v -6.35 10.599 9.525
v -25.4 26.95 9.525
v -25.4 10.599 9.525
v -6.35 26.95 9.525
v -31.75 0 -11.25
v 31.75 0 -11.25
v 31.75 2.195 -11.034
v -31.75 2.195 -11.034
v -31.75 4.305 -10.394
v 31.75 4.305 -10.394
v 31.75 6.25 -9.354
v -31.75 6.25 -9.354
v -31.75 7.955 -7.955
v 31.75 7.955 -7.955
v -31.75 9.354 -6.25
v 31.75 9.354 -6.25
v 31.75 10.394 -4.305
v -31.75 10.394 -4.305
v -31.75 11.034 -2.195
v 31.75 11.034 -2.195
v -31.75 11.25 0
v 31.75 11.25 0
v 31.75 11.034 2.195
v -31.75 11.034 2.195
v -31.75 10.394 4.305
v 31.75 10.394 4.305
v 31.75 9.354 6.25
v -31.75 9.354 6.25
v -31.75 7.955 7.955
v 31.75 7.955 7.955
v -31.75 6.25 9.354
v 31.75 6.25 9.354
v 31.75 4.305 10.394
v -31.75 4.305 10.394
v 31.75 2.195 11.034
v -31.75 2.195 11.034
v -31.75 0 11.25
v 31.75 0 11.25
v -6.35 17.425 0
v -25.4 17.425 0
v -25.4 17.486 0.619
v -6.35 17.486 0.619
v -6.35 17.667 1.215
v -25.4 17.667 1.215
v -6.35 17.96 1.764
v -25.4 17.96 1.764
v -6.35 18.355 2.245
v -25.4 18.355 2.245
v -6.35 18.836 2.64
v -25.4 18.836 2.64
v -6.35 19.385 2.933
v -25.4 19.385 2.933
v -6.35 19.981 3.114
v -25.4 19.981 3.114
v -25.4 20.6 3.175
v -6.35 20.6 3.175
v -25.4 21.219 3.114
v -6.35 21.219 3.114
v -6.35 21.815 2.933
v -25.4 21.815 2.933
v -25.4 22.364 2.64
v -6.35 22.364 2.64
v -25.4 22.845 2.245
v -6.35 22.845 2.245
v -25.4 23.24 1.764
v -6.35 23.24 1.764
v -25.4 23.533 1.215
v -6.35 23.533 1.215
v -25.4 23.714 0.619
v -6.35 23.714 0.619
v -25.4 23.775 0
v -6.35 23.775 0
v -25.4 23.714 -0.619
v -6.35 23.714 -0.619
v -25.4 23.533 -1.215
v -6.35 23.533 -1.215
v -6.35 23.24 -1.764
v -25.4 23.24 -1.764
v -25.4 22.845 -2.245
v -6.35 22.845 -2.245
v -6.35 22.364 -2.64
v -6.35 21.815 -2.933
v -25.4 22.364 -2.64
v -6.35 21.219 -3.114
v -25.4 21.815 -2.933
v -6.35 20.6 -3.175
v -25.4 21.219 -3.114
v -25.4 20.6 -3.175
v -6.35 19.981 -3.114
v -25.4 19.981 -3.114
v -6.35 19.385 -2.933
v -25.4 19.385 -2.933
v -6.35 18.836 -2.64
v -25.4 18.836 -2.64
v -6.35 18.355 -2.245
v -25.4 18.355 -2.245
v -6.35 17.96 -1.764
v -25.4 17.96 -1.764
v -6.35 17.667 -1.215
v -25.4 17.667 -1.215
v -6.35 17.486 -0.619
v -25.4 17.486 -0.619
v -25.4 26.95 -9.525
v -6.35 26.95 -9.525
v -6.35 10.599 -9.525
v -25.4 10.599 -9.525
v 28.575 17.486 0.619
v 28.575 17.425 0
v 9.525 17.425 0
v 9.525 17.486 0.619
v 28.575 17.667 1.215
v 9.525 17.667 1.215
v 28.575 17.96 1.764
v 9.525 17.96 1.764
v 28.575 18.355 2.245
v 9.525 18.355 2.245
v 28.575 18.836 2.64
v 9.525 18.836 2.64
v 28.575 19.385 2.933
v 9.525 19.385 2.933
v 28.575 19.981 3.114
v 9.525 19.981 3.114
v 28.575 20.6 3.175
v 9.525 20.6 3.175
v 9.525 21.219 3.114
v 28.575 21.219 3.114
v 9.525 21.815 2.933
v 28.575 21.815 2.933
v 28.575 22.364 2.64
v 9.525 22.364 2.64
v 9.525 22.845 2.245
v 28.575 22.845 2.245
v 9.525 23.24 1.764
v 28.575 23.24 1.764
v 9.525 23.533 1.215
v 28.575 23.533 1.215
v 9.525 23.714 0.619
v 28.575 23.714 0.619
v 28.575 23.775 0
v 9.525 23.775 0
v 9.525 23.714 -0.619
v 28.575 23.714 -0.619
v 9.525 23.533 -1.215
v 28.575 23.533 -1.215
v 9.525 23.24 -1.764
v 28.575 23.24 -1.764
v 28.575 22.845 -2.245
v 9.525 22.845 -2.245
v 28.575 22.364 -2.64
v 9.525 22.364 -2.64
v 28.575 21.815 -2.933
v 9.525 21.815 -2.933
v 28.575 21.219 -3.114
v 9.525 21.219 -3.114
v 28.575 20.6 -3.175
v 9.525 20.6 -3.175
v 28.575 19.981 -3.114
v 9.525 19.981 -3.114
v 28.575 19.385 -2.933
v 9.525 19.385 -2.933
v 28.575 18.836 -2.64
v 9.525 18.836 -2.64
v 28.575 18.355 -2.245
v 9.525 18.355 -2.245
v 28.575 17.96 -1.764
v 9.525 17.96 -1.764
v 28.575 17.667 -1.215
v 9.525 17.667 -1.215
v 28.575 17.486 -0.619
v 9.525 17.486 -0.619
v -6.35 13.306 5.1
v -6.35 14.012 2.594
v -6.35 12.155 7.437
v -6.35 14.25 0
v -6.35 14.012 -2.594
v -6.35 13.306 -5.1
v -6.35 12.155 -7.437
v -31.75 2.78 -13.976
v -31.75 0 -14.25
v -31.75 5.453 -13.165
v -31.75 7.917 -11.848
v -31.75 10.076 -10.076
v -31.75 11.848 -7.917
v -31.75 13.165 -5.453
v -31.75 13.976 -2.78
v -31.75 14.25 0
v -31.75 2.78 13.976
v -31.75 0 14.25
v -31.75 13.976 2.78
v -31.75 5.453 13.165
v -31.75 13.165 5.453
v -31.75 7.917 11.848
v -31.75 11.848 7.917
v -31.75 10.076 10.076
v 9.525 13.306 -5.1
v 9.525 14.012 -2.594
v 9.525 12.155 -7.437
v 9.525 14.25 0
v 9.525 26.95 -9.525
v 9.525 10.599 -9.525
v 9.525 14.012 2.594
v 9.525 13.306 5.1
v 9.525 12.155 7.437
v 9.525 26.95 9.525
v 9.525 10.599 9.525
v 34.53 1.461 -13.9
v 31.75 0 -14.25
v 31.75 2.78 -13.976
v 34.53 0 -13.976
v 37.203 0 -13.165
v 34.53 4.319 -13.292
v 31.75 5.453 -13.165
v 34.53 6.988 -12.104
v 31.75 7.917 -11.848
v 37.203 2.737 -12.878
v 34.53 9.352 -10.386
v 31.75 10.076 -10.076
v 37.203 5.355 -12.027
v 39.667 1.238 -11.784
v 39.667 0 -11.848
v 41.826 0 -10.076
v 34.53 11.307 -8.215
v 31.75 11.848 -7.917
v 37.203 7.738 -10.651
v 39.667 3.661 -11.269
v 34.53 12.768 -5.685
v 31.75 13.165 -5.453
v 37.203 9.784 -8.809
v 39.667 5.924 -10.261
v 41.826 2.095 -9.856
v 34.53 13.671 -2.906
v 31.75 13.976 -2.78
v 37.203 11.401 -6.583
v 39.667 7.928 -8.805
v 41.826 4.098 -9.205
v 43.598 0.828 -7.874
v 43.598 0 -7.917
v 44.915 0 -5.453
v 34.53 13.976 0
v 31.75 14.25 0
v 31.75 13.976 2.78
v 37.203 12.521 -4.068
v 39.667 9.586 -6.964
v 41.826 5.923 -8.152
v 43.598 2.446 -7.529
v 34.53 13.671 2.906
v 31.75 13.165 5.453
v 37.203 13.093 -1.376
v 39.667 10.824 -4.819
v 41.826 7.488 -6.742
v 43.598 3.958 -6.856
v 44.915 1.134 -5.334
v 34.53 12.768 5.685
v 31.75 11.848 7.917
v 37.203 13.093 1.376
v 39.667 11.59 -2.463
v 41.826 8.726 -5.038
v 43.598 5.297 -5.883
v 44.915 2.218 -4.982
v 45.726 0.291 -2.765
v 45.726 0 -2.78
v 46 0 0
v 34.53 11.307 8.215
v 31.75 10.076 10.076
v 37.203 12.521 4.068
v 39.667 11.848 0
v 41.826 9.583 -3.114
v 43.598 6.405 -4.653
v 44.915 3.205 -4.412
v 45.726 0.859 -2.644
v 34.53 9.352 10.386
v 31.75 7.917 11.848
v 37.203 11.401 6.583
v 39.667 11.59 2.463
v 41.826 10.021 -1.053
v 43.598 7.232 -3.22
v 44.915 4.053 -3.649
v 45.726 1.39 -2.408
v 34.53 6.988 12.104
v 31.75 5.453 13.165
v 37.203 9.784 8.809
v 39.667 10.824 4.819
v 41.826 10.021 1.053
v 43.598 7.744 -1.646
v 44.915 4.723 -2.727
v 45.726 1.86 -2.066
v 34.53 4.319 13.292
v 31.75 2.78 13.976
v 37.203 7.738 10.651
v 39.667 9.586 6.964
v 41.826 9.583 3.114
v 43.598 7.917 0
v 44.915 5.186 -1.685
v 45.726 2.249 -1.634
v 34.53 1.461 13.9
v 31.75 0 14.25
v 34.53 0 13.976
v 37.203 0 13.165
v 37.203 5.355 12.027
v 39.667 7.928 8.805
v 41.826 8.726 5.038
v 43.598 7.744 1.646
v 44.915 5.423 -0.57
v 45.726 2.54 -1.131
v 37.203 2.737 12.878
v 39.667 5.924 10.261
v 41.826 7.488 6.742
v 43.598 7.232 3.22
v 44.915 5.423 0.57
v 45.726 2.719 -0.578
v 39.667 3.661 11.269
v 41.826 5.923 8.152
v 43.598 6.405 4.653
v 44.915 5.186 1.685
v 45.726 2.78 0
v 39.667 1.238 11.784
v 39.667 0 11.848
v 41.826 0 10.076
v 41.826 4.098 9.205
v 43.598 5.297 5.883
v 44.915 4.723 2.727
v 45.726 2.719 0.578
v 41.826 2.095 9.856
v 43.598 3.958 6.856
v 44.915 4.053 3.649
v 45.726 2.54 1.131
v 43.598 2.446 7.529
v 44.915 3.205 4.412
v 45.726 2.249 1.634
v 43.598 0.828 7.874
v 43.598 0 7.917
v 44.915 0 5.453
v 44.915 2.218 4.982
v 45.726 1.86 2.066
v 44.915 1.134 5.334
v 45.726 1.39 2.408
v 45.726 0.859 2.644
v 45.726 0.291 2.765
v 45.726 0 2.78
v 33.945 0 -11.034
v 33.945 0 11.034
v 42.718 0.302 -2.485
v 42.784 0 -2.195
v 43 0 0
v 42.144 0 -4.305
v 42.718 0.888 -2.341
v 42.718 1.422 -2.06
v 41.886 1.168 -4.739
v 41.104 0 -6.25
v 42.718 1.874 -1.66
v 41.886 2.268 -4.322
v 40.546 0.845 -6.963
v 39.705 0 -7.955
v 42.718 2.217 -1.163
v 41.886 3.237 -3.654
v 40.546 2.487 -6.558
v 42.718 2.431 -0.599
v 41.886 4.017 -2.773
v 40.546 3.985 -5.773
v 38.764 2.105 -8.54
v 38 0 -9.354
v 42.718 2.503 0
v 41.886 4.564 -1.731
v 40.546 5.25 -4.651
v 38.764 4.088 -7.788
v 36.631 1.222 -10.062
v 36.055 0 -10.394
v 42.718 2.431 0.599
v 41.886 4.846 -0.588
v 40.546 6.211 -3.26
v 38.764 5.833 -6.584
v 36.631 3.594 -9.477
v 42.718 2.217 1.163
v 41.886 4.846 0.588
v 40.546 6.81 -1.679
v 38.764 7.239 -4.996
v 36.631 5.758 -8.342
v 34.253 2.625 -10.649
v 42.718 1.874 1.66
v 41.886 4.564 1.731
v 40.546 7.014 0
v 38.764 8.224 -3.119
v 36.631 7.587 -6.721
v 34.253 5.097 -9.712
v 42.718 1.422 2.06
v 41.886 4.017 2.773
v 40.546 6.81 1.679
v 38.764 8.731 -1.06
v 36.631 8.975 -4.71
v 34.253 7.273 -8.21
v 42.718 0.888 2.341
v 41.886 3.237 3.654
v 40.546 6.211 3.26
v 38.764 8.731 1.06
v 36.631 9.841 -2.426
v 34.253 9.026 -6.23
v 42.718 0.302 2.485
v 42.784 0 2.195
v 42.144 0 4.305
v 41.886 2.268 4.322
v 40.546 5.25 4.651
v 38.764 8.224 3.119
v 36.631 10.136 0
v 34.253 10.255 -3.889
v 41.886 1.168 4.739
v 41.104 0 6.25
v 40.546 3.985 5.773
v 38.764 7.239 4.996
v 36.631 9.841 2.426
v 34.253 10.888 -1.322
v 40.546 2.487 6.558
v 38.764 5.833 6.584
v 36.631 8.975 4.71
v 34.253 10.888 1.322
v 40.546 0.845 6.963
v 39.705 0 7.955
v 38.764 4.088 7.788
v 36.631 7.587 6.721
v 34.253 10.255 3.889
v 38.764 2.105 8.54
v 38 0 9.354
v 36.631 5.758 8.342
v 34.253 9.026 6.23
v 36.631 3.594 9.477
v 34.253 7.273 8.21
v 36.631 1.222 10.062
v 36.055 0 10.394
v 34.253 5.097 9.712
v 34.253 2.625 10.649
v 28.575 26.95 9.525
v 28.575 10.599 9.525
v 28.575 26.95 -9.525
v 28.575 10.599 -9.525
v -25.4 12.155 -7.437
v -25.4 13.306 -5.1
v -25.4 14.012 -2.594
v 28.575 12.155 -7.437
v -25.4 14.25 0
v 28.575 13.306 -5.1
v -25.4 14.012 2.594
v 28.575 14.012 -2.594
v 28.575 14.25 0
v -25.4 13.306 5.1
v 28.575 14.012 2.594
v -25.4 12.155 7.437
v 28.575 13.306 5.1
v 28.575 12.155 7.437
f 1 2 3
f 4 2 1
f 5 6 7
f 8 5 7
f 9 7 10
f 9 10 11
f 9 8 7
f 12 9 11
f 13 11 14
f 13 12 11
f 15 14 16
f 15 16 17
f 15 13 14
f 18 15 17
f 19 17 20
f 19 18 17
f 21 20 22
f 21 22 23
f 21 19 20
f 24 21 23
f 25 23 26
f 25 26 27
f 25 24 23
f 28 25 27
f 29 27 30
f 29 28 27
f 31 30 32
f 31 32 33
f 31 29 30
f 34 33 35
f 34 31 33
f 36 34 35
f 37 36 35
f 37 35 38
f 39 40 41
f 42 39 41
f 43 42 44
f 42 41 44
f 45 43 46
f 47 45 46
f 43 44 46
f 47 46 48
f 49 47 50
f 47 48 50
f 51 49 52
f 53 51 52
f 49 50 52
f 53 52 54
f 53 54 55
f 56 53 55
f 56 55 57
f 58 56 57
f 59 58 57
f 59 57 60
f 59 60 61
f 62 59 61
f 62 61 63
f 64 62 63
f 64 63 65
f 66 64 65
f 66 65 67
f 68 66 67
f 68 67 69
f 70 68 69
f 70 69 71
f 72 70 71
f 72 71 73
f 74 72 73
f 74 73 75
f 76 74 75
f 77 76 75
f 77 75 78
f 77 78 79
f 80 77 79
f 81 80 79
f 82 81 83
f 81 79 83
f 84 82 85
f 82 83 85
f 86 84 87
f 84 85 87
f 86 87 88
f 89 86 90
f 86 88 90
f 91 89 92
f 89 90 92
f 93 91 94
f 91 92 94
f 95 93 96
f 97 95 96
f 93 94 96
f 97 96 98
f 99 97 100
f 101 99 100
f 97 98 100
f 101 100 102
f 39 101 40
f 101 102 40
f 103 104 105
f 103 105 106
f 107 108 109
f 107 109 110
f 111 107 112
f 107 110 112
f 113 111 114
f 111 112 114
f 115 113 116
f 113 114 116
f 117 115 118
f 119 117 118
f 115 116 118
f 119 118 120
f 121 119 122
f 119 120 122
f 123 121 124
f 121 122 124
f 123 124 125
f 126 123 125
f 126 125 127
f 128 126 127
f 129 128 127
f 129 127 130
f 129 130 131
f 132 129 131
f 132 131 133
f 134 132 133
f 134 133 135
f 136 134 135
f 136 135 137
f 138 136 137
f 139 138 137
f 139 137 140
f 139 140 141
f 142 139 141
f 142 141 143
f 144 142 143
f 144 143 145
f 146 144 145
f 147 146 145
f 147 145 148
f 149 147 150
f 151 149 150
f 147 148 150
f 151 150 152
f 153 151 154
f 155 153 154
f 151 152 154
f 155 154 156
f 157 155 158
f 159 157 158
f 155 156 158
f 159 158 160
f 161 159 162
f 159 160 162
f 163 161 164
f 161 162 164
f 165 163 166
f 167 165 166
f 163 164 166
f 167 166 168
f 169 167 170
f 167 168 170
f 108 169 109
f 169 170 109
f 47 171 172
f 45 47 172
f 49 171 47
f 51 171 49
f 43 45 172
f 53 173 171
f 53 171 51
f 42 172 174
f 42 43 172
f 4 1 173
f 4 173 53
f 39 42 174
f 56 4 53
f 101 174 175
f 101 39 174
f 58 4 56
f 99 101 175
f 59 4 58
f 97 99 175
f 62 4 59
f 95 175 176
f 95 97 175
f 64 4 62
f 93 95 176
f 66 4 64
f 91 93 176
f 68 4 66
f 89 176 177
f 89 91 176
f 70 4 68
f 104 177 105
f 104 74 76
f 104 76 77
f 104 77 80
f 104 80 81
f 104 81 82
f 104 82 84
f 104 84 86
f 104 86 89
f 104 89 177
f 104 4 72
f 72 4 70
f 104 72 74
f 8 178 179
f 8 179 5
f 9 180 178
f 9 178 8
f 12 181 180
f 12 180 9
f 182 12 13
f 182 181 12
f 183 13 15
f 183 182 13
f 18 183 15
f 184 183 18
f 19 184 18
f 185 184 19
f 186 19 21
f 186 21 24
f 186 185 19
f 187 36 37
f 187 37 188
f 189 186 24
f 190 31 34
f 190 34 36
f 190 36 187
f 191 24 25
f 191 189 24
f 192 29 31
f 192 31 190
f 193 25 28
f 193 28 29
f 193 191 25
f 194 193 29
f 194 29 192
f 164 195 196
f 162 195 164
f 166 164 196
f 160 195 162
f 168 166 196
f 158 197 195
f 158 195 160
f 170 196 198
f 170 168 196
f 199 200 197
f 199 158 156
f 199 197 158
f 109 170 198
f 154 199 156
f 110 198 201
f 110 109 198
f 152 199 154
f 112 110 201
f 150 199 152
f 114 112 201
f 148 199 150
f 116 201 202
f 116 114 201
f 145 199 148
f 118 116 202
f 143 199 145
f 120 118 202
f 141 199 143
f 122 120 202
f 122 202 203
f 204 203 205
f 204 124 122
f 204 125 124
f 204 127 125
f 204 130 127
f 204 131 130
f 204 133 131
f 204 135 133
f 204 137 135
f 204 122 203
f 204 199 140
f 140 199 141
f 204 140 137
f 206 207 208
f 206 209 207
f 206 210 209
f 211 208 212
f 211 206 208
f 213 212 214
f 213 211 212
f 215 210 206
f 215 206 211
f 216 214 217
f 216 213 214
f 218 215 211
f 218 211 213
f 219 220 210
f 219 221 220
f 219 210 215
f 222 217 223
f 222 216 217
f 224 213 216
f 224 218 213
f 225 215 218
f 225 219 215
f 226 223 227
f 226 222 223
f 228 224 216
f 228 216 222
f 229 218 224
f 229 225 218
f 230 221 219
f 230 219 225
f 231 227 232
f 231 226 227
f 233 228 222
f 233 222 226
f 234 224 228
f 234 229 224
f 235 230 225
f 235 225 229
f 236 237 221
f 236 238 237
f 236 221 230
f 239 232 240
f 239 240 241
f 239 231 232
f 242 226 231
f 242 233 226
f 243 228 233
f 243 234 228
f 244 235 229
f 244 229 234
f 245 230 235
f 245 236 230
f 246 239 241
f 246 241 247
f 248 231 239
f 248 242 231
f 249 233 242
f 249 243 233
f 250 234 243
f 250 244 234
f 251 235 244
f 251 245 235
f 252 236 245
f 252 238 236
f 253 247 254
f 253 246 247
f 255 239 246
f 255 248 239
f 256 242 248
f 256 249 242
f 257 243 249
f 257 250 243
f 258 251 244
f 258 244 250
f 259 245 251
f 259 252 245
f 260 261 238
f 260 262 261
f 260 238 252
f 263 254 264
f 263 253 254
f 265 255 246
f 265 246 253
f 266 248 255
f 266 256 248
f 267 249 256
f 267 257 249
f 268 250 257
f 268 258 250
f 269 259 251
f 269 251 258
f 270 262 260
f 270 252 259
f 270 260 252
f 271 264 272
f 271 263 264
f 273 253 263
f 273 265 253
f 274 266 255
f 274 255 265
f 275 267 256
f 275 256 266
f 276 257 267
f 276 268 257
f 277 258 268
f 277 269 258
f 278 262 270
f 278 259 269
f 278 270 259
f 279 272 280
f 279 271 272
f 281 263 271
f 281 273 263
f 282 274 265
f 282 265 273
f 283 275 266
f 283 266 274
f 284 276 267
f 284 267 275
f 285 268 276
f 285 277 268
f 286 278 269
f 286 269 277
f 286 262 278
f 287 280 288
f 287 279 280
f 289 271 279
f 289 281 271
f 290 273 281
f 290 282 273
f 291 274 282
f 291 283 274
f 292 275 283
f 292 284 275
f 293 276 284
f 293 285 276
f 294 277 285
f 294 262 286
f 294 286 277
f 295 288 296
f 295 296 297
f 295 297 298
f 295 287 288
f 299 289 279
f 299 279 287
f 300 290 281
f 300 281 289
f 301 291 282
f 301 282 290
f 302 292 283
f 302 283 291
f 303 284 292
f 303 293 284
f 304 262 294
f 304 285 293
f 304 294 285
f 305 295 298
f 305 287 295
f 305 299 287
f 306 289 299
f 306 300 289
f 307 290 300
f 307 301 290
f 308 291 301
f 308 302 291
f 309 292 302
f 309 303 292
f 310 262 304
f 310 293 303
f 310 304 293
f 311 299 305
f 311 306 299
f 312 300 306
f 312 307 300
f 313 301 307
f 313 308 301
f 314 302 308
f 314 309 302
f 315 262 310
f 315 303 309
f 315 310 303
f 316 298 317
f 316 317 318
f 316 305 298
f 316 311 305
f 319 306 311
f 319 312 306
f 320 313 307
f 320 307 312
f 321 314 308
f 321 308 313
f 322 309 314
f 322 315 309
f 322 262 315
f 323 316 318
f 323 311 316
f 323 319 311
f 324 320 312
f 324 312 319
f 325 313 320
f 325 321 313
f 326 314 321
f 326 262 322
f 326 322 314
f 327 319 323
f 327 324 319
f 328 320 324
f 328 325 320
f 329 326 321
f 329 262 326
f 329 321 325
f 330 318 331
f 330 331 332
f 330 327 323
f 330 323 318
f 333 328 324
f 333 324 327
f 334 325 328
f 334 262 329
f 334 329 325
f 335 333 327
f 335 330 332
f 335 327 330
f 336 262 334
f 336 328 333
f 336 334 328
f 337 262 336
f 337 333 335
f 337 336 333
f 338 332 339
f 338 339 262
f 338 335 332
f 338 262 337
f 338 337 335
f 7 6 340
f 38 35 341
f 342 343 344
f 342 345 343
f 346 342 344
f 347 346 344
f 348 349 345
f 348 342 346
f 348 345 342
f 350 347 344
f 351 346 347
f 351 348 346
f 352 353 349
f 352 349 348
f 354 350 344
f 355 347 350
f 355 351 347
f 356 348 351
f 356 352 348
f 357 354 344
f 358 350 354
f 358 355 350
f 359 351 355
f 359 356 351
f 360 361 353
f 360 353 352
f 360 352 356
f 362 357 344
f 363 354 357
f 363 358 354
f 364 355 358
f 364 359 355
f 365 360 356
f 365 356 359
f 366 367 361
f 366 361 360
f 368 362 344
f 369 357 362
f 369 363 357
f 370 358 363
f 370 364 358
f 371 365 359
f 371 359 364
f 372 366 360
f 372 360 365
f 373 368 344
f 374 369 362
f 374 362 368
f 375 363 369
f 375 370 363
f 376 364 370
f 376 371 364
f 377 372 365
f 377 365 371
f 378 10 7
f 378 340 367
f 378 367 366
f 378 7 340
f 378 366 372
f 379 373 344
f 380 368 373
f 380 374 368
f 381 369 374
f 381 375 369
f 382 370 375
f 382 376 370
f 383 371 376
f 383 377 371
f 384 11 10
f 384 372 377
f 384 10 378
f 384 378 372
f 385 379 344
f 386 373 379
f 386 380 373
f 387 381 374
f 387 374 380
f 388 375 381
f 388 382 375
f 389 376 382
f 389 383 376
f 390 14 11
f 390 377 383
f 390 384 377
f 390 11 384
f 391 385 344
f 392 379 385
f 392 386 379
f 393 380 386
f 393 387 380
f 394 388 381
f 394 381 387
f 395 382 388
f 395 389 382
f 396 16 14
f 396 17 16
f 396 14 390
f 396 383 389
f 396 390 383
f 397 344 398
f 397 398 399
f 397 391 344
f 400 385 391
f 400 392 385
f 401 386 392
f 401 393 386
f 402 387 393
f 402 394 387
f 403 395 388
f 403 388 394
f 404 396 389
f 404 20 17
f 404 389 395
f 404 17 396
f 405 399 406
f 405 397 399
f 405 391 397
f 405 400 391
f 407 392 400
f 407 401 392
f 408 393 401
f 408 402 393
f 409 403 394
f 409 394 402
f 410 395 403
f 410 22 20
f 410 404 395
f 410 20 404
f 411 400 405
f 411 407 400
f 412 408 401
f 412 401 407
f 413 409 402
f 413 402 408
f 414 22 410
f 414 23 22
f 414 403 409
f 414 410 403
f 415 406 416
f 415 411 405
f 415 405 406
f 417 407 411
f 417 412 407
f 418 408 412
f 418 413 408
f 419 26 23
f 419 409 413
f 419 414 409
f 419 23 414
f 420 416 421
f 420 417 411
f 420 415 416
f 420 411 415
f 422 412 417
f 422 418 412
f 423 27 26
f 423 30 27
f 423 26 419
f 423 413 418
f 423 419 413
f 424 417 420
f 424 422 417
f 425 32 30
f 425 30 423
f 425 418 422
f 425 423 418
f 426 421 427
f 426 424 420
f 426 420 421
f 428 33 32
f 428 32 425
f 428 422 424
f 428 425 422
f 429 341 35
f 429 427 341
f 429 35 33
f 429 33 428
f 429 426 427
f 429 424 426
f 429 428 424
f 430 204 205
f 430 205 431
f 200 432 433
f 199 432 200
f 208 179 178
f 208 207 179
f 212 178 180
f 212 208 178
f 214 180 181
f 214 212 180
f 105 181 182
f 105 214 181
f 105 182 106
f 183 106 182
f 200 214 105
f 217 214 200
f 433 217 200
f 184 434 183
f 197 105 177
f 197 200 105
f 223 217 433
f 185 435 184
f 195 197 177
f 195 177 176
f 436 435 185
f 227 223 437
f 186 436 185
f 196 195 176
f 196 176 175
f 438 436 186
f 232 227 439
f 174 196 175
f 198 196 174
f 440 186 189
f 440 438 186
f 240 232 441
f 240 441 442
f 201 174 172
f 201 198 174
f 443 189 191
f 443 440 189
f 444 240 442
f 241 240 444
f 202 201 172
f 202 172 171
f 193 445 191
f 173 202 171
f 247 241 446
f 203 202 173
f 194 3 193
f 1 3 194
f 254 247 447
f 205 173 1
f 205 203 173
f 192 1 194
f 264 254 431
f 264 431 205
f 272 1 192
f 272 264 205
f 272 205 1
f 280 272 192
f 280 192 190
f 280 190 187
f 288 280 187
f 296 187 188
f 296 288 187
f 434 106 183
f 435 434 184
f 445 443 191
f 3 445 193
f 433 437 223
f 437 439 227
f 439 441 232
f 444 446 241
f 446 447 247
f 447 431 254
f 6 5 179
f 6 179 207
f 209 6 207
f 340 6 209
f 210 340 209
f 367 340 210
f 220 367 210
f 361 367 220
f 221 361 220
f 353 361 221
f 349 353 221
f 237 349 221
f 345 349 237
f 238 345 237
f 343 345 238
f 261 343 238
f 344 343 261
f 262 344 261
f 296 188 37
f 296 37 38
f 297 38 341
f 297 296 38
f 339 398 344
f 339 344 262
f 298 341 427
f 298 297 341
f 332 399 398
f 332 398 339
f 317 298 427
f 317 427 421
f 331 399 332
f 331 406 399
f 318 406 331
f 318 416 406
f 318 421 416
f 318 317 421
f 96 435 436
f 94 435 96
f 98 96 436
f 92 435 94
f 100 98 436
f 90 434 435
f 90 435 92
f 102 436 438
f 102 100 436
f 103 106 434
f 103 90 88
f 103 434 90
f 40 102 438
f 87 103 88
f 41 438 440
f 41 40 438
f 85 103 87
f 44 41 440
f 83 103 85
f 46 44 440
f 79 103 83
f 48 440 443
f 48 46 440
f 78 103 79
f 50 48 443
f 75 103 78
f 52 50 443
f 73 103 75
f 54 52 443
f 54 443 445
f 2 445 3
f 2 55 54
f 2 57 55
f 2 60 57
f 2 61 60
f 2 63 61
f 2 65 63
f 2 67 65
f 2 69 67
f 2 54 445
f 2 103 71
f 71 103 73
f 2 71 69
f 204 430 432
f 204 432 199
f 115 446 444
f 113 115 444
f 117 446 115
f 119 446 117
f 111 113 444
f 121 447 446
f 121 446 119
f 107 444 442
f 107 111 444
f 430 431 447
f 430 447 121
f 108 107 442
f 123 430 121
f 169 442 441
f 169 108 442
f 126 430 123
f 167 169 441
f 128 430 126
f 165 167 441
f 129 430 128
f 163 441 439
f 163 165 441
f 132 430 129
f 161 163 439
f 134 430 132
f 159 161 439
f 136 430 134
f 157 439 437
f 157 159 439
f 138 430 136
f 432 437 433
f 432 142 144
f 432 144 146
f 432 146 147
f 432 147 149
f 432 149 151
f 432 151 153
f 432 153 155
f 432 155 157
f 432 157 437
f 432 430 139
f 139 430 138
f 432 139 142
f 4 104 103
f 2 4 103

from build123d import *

# Parameters (mm, degrees)
F1_ANGLE = 180
F6_R     = 3.175
F7_DEPTH = 71.401


with BuildPart() as f1:
    # F0 (on Front) → F1 (revolve)
    with BuildSketch(Plane.XZ):
        with BuildLine():
            ThreePointArc((43, 0), (39.7049512883, -7.9549512883), (31.75, -11.25))
            Line((31.75, -11.25), (0, -11.25))
            Line((0, -11.25), (-31.75, -11.25))
            Line((-31.75, -11.25), (-31.75, -14.25))
            Line((-31.75, -14.25), (31.75, -14.25))
            ThreePointArc((31.75, -14.25), (41.8262716319, -10.0762716319), (46, 0))
            Line((46, 0), (43, 0))
        make_face()
    revolve(axis=Axis((28.0016548932, 0, 0), (1, 0, 0)), revolution_arc=F1_ANGLE)

    # F4 (on face) → F5 (join, up to the next surface of F1)
    with BuildSketch(Plane(origin=(0, 26.95, 0), x_dir=(-1, 0, 0), z_dir=(0, 1, 0))):
        Polygon((25.4, 9.525), (6.35, 9.525), (6.35, 0), (6.35, -9.525), (25.4, -9.525), (25.4, 0), align=None)
        Polygon((-9.525, 0), (-9.525, 9.525), (-28.575, 9.525), (-28.575, 0), (-28.575, -9.525), (-9.525, -9.525), align=None)
    extrude(until=Until.NEXT, dir=(0, -1, 0))

    # F6 (on face) → F7 (cut, through all)
    with BuildSketch(Plane(origin=(-25.4, 0, 0), x_dir=(0, -1, 0), z_dir=(-1, 0, 0))):
        with Locations((-20.6, 0)):
            Circle(F6_R)
    extrude(amount=-F7_DEPTH, mode=Mode.SUBTRACT)


solid = f1.part
